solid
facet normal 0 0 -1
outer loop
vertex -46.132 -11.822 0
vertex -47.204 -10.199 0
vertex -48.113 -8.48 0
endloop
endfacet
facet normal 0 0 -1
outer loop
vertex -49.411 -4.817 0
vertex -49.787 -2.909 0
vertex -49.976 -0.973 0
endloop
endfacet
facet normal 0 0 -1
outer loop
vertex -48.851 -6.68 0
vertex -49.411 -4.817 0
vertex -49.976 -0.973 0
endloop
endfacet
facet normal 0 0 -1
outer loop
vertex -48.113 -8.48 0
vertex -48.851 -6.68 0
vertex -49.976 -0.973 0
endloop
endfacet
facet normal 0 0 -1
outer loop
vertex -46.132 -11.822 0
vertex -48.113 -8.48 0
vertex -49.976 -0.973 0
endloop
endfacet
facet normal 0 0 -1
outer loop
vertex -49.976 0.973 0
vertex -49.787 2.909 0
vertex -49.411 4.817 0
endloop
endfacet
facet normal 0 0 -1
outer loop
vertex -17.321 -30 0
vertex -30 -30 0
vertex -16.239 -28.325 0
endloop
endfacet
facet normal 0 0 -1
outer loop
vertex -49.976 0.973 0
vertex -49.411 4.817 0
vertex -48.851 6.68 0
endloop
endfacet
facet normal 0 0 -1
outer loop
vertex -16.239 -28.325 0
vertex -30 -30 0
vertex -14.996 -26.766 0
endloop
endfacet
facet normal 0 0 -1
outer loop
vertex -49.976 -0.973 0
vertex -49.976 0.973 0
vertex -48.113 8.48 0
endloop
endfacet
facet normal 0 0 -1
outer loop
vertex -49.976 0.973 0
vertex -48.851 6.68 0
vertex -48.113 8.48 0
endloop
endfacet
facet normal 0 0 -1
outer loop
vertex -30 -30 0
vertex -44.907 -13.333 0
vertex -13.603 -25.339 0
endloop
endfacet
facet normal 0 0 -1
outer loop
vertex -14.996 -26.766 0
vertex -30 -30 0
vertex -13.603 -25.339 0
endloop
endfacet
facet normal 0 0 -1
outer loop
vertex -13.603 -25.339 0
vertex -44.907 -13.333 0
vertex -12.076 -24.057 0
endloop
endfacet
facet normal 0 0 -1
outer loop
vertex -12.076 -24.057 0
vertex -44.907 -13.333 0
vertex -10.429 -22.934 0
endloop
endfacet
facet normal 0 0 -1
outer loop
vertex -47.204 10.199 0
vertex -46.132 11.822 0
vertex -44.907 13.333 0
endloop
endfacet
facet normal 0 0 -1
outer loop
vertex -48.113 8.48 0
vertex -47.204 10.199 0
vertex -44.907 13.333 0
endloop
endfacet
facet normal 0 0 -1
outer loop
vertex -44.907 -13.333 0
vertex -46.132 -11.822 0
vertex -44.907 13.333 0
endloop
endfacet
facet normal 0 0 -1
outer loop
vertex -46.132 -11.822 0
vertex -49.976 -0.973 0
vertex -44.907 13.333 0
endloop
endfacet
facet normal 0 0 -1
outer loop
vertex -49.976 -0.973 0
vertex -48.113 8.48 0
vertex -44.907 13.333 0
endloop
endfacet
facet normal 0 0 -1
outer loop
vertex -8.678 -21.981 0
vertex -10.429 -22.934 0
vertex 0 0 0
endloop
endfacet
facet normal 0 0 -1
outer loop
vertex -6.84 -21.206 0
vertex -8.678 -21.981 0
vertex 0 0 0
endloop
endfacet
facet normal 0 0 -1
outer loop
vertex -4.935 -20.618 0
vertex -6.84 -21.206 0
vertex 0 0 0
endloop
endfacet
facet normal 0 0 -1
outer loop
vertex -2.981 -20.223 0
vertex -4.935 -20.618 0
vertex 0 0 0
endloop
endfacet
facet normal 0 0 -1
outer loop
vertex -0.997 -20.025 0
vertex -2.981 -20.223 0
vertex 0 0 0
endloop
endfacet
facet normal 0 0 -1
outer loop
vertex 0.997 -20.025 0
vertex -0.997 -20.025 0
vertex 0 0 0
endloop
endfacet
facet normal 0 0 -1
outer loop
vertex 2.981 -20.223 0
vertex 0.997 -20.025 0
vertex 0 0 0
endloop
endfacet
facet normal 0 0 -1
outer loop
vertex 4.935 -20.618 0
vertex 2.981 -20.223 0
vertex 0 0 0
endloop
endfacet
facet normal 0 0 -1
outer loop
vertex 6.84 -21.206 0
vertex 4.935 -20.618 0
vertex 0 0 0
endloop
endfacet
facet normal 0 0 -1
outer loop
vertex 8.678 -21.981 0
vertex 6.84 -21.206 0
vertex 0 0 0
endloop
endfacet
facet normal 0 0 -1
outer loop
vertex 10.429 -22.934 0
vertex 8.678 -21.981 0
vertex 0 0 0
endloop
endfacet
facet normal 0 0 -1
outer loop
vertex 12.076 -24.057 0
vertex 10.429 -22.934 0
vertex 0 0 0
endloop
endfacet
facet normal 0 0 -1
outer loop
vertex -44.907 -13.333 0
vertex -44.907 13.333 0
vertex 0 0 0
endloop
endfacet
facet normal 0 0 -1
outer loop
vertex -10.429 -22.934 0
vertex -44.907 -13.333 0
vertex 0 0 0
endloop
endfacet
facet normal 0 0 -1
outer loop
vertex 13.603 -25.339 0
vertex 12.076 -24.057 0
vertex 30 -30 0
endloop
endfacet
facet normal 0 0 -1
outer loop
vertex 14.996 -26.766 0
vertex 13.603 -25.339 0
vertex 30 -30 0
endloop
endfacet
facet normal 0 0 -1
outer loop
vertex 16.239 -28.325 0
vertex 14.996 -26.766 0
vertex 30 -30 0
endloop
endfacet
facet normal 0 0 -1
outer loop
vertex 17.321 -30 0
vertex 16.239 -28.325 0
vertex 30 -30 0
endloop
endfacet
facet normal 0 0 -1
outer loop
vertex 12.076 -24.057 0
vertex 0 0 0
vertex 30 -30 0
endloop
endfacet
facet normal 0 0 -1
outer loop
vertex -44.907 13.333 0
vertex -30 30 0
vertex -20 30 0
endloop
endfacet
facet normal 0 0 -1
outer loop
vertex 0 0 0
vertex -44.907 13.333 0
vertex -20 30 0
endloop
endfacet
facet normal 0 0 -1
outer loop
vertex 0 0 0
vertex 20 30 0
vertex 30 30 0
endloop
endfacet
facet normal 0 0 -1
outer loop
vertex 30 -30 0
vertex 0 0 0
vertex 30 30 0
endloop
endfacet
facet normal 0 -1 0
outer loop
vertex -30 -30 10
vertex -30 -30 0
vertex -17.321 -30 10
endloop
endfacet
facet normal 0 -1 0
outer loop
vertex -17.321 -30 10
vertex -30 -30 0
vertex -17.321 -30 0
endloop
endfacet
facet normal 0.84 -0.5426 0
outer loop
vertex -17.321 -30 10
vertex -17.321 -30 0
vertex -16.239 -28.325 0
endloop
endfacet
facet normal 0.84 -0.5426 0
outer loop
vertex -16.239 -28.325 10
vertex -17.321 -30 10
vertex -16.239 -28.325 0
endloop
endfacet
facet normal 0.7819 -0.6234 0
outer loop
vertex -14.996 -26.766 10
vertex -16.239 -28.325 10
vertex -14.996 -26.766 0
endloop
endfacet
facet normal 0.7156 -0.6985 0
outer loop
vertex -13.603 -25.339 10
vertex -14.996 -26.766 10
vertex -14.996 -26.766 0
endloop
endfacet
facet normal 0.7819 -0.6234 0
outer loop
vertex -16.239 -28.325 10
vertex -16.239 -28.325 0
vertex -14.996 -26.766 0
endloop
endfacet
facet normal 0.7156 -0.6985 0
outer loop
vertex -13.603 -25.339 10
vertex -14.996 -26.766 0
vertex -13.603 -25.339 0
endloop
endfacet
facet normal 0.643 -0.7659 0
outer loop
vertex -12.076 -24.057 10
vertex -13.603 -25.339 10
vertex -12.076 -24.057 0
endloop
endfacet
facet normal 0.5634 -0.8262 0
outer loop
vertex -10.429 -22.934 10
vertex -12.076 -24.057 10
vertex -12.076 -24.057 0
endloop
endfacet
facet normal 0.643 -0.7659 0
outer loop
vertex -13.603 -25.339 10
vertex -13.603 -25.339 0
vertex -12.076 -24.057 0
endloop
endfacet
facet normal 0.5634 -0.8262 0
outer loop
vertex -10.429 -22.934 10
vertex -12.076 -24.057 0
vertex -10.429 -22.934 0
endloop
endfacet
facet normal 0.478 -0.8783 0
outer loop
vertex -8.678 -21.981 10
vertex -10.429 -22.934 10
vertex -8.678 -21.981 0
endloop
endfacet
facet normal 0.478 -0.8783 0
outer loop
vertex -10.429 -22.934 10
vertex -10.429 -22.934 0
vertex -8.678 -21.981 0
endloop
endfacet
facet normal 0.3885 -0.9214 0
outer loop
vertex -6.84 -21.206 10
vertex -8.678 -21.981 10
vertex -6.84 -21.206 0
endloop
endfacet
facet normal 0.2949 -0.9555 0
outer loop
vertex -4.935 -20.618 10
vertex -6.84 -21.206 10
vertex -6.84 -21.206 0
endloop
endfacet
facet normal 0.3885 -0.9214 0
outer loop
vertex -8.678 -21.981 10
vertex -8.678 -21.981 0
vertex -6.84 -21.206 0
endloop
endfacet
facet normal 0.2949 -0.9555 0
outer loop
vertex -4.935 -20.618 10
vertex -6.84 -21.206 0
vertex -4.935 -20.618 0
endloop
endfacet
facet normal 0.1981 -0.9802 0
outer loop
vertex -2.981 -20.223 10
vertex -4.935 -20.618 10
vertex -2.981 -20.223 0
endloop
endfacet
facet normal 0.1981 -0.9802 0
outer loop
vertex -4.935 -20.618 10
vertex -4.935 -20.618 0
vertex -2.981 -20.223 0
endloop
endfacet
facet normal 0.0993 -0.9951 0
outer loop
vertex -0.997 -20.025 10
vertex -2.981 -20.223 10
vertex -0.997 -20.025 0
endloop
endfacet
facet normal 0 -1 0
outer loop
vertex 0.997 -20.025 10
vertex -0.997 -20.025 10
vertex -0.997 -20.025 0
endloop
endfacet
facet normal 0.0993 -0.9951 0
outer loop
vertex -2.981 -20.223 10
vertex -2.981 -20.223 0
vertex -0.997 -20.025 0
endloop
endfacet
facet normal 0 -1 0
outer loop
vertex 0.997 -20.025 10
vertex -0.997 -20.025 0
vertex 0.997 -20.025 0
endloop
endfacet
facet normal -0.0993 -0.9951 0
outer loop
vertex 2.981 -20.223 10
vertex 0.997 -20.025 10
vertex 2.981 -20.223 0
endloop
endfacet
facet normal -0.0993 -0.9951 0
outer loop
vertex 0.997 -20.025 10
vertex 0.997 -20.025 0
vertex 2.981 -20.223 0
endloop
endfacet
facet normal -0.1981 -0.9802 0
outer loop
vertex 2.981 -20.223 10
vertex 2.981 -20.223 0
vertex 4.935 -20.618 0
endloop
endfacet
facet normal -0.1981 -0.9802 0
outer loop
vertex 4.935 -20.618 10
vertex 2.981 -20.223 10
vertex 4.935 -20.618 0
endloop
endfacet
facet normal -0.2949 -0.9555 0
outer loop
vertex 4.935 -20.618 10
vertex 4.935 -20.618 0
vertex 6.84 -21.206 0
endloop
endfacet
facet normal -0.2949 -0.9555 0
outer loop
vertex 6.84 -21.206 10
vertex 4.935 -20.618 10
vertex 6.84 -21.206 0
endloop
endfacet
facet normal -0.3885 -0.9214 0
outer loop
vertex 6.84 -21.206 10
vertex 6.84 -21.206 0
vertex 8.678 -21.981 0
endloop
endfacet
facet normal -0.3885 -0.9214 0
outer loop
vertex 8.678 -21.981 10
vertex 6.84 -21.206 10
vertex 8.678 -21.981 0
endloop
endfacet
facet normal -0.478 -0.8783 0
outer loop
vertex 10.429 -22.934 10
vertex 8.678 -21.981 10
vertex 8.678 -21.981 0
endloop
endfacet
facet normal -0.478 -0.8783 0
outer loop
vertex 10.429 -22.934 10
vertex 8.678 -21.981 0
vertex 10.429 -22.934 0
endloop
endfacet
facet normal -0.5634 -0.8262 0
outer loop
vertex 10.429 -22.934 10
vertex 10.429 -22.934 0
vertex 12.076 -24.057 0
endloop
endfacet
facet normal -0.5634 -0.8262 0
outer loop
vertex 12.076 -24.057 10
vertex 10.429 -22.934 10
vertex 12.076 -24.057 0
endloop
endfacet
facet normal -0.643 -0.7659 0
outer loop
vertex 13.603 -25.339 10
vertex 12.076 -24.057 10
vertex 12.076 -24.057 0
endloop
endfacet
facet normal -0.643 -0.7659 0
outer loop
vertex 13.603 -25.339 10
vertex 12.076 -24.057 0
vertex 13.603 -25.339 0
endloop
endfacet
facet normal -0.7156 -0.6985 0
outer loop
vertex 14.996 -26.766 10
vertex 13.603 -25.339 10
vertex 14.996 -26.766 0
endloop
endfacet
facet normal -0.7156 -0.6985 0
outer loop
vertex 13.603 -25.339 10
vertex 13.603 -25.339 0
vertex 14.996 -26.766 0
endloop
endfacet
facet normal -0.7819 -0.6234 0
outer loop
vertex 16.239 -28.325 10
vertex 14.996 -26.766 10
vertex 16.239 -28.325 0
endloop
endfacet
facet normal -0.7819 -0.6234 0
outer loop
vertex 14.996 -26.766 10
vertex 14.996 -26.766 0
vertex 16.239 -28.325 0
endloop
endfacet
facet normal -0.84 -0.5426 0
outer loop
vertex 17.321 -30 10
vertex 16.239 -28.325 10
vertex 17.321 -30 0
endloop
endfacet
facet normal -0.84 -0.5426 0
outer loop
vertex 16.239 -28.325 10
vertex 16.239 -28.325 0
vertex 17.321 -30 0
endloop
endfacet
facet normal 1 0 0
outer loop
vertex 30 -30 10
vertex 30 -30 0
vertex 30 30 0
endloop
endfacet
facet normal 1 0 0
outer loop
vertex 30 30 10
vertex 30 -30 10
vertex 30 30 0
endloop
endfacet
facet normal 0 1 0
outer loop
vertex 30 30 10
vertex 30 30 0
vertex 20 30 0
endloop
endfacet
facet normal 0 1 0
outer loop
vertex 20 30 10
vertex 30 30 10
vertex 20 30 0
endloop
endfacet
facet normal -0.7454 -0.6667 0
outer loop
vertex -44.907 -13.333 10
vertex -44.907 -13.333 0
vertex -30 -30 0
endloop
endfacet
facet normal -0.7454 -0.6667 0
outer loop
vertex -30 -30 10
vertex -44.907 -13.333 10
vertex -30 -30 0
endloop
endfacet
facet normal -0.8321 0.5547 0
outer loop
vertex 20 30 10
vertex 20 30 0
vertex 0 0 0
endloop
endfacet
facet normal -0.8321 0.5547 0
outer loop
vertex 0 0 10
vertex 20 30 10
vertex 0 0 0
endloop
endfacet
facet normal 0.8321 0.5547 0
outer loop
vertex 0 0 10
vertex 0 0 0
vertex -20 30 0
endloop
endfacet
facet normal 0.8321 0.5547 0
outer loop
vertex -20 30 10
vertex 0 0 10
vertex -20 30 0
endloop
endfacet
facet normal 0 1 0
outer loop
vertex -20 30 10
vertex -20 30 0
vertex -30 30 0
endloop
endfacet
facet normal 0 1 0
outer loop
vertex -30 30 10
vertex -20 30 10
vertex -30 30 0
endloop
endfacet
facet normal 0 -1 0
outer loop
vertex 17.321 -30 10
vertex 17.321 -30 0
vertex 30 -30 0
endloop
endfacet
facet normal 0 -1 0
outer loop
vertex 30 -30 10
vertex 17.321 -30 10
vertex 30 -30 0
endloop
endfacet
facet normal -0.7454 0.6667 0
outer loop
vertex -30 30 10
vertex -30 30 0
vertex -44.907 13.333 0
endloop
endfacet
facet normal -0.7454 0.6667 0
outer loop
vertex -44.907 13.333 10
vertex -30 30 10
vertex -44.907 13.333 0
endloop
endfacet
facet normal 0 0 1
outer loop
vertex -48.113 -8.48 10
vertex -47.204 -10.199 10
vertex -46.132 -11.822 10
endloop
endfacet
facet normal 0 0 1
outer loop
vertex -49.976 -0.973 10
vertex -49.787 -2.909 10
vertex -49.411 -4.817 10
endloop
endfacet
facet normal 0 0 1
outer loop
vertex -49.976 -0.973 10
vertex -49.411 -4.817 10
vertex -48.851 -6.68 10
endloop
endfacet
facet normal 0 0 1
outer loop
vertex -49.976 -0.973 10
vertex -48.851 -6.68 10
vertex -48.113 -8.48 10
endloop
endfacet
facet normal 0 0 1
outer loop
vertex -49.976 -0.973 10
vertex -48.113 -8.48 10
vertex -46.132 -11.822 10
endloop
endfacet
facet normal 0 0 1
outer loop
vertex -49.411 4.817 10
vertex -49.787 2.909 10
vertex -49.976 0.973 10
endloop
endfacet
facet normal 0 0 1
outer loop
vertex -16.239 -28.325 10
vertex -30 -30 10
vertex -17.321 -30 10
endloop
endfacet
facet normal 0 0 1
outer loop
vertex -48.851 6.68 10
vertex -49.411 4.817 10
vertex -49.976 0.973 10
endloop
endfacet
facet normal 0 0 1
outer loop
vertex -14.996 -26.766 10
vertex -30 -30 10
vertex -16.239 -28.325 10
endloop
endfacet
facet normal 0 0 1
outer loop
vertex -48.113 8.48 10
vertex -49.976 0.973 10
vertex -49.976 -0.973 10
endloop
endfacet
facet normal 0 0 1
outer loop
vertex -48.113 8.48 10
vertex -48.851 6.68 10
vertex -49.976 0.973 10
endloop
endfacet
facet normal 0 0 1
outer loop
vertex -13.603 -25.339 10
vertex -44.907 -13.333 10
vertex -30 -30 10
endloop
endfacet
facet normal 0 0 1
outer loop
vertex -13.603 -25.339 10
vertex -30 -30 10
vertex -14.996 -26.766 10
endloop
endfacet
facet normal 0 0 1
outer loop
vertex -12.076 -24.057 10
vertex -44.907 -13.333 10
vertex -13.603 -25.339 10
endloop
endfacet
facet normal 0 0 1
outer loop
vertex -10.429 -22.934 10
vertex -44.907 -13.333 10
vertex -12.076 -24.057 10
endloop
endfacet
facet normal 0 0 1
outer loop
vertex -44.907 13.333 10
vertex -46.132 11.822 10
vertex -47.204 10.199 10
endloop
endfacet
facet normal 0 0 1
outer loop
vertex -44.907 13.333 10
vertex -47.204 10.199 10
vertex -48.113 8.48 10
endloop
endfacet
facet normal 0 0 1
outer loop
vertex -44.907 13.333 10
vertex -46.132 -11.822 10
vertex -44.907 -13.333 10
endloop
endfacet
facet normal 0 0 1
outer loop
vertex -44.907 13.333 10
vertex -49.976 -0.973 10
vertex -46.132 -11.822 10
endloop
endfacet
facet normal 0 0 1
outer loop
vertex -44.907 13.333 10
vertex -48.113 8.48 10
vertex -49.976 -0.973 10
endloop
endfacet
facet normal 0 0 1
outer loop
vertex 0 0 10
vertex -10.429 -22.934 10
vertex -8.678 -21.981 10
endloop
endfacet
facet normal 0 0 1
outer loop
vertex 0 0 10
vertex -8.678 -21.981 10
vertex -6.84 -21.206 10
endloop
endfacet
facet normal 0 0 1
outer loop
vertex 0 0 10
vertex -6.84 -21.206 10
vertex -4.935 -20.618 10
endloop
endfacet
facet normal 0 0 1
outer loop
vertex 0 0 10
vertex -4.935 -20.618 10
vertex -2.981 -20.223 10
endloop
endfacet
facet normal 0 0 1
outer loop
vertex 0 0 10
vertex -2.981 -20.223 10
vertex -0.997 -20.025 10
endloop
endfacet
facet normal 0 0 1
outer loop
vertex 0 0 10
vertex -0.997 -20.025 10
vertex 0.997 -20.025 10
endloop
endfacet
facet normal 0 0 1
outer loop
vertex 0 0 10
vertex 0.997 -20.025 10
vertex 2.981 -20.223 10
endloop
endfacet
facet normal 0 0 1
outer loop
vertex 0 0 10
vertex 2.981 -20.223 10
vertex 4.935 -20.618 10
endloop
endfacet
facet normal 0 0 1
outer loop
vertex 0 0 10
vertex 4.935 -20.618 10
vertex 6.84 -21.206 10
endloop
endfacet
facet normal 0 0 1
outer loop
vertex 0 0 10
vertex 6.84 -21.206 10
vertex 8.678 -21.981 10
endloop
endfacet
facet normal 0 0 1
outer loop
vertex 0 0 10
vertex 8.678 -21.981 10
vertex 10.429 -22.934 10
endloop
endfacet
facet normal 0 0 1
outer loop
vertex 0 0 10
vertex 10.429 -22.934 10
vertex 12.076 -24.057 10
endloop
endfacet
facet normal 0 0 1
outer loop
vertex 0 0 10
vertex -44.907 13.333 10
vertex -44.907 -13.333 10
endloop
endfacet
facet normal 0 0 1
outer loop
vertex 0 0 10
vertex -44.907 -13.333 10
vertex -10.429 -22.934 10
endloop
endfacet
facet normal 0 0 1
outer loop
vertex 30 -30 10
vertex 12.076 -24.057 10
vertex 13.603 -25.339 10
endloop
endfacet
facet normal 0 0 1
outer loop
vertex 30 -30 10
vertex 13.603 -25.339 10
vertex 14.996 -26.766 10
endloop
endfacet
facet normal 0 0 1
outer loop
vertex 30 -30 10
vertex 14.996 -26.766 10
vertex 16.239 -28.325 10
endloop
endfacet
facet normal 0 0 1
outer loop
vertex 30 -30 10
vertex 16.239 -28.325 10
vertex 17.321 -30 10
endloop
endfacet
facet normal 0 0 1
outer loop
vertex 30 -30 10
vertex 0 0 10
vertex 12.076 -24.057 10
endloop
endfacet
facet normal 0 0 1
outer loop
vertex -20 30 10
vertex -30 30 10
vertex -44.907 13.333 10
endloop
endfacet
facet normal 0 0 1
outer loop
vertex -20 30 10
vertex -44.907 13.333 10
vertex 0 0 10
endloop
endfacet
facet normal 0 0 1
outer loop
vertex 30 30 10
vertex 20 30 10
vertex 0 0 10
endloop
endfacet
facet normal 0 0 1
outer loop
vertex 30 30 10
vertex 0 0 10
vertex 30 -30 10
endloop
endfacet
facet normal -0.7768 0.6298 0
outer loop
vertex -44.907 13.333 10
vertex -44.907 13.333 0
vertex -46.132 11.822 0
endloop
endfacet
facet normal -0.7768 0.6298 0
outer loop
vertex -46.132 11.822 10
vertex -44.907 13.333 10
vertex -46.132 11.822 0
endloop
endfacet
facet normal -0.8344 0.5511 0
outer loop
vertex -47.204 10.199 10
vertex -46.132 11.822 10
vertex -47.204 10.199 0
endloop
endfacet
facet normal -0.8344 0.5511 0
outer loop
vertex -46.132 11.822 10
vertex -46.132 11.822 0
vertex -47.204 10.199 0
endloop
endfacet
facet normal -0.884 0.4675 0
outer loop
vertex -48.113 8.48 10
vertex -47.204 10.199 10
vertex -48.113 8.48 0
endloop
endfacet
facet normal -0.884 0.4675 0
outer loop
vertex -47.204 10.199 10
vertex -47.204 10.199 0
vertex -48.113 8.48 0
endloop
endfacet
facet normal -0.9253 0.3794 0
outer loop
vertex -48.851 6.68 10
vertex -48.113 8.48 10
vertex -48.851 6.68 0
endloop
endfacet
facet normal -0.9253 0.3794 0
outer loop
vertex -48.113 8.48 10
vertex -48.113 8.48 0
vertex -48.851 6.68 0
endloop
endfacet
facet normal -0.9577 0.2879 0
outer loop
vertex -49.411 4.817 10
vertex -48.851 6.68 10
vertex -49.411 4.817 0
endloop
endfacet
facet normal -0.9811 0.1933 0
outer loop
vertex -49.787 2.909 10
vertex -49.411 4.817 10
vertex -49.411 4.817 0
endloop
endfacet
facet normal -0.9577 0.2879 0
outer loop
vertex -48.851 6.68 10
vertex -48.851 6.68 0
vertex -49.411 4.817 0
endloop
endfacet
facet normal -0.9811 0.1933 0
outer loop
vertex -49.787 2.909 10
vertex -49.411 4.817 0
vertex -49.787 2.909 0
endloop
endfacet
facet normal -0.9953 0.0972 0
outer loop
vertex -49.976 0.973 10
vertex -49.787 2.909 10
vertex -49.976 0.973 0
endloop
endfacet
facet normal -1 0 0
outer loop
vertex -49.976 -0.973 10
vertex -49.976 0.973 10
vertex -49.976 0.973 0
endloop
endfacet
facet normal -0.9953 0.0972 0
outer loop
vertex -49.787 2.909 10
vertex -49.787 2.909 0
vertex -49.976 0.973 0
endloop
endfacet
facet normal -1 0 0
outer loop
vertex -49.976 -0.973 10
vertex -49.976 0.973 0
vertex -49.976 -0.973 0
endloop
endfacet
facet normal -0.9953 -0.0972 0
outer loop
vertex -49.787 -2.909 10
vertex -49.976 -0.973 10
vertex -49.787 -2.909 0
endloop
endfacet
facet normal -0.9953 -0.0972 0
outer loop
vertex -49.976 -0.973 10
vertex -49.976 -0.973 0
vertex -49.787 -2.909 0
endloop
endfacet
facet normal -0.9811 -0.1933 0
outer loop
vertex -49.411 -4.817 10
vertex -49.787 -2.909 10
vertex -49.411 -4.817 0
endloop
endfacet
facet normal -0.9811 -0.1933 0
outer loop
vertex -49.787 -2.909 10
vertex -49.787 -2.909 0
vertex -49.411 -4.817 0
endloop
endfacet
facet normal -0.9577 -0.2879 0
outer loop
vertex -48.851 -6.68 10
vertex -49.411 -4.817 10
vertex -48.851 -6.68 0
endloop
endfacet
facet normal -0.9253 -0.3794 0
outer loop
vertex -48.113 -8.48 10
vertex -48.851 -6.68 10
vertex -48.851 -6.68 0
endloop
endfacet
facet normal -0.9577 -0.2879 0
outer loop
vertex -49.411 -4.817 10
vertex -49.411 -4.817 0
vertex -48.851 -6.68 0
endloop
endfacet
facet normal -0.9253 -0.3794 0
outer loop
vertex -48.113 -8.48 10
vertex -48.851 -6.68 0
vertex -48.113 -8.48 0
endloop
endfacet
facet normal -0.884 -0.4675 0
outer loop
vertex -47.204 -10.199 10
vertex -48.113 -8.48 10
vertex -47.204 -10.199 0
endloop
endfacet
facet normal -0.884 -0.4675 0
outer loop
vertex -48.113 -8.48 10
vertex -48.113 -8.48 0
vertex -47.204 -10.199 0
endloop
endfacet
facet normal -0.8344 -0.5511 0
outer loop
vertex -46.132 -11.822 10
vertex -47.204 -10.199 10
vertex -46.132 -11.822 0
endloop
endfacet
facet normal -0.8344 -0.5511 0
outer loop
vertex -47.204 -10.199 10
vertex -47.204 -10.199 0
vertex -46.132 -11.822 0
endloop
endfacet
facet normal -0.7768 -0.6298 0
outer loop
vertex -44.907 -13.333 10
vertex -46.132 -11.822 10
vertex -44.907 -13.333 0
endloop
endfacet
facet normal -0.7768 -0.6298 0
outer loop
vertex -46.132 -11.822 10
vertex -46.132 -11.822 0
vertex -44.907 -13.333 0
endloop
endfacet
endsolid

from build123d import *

# Parameters (mm, degrees)
F1_DEPTH = 10


with BuildPart() as f1:
    # F0 (on Top) → F1 (new body)
    with BuildSketch(Plane.XY):
        with BuildLine():
            Line((20, 30), (0, 0))
            Line((0, 0), (-20, 30))
            Line((-20, 30), (-30, 30))
            Line((-30, 30), (-44.90712, 13.333333))
            ThreePointArc((-44.90712, 13.333333), (-22.863558, 18.683447), (-10, 0))
            ThreePointArc((-10, 0), (-22.863558, -18.683447), (-44.90712, -13.333333))
            Line((-44.90712, -13.333333), (-30, -30))
            Line((-30, -30), (-17.320508, -30))
            ThreePointArc((-17.320508, -30), (0, -20), (17.320508, -30))
            Line((17.320508, -30), (30, -30))
            Line((30, -30), (30, 30))
            Line((30, 30), (20, 30))
        make_face()
        with BuildLine():
            ThreePointArc((-10, 0), (-22.863558, 18.683447), (-44.90712, 13.333333))
            ThreePointArc((-44.90712, 13.333333), (-50, 0), (-44.90712, -13.333333))
            ThreePointArc((-44.90712, -13.333333), (-22.863558, -18.683447), (-10, 0))
        make_face()
    extrude(amount=F1_DEPTH)


solid = f1.part
